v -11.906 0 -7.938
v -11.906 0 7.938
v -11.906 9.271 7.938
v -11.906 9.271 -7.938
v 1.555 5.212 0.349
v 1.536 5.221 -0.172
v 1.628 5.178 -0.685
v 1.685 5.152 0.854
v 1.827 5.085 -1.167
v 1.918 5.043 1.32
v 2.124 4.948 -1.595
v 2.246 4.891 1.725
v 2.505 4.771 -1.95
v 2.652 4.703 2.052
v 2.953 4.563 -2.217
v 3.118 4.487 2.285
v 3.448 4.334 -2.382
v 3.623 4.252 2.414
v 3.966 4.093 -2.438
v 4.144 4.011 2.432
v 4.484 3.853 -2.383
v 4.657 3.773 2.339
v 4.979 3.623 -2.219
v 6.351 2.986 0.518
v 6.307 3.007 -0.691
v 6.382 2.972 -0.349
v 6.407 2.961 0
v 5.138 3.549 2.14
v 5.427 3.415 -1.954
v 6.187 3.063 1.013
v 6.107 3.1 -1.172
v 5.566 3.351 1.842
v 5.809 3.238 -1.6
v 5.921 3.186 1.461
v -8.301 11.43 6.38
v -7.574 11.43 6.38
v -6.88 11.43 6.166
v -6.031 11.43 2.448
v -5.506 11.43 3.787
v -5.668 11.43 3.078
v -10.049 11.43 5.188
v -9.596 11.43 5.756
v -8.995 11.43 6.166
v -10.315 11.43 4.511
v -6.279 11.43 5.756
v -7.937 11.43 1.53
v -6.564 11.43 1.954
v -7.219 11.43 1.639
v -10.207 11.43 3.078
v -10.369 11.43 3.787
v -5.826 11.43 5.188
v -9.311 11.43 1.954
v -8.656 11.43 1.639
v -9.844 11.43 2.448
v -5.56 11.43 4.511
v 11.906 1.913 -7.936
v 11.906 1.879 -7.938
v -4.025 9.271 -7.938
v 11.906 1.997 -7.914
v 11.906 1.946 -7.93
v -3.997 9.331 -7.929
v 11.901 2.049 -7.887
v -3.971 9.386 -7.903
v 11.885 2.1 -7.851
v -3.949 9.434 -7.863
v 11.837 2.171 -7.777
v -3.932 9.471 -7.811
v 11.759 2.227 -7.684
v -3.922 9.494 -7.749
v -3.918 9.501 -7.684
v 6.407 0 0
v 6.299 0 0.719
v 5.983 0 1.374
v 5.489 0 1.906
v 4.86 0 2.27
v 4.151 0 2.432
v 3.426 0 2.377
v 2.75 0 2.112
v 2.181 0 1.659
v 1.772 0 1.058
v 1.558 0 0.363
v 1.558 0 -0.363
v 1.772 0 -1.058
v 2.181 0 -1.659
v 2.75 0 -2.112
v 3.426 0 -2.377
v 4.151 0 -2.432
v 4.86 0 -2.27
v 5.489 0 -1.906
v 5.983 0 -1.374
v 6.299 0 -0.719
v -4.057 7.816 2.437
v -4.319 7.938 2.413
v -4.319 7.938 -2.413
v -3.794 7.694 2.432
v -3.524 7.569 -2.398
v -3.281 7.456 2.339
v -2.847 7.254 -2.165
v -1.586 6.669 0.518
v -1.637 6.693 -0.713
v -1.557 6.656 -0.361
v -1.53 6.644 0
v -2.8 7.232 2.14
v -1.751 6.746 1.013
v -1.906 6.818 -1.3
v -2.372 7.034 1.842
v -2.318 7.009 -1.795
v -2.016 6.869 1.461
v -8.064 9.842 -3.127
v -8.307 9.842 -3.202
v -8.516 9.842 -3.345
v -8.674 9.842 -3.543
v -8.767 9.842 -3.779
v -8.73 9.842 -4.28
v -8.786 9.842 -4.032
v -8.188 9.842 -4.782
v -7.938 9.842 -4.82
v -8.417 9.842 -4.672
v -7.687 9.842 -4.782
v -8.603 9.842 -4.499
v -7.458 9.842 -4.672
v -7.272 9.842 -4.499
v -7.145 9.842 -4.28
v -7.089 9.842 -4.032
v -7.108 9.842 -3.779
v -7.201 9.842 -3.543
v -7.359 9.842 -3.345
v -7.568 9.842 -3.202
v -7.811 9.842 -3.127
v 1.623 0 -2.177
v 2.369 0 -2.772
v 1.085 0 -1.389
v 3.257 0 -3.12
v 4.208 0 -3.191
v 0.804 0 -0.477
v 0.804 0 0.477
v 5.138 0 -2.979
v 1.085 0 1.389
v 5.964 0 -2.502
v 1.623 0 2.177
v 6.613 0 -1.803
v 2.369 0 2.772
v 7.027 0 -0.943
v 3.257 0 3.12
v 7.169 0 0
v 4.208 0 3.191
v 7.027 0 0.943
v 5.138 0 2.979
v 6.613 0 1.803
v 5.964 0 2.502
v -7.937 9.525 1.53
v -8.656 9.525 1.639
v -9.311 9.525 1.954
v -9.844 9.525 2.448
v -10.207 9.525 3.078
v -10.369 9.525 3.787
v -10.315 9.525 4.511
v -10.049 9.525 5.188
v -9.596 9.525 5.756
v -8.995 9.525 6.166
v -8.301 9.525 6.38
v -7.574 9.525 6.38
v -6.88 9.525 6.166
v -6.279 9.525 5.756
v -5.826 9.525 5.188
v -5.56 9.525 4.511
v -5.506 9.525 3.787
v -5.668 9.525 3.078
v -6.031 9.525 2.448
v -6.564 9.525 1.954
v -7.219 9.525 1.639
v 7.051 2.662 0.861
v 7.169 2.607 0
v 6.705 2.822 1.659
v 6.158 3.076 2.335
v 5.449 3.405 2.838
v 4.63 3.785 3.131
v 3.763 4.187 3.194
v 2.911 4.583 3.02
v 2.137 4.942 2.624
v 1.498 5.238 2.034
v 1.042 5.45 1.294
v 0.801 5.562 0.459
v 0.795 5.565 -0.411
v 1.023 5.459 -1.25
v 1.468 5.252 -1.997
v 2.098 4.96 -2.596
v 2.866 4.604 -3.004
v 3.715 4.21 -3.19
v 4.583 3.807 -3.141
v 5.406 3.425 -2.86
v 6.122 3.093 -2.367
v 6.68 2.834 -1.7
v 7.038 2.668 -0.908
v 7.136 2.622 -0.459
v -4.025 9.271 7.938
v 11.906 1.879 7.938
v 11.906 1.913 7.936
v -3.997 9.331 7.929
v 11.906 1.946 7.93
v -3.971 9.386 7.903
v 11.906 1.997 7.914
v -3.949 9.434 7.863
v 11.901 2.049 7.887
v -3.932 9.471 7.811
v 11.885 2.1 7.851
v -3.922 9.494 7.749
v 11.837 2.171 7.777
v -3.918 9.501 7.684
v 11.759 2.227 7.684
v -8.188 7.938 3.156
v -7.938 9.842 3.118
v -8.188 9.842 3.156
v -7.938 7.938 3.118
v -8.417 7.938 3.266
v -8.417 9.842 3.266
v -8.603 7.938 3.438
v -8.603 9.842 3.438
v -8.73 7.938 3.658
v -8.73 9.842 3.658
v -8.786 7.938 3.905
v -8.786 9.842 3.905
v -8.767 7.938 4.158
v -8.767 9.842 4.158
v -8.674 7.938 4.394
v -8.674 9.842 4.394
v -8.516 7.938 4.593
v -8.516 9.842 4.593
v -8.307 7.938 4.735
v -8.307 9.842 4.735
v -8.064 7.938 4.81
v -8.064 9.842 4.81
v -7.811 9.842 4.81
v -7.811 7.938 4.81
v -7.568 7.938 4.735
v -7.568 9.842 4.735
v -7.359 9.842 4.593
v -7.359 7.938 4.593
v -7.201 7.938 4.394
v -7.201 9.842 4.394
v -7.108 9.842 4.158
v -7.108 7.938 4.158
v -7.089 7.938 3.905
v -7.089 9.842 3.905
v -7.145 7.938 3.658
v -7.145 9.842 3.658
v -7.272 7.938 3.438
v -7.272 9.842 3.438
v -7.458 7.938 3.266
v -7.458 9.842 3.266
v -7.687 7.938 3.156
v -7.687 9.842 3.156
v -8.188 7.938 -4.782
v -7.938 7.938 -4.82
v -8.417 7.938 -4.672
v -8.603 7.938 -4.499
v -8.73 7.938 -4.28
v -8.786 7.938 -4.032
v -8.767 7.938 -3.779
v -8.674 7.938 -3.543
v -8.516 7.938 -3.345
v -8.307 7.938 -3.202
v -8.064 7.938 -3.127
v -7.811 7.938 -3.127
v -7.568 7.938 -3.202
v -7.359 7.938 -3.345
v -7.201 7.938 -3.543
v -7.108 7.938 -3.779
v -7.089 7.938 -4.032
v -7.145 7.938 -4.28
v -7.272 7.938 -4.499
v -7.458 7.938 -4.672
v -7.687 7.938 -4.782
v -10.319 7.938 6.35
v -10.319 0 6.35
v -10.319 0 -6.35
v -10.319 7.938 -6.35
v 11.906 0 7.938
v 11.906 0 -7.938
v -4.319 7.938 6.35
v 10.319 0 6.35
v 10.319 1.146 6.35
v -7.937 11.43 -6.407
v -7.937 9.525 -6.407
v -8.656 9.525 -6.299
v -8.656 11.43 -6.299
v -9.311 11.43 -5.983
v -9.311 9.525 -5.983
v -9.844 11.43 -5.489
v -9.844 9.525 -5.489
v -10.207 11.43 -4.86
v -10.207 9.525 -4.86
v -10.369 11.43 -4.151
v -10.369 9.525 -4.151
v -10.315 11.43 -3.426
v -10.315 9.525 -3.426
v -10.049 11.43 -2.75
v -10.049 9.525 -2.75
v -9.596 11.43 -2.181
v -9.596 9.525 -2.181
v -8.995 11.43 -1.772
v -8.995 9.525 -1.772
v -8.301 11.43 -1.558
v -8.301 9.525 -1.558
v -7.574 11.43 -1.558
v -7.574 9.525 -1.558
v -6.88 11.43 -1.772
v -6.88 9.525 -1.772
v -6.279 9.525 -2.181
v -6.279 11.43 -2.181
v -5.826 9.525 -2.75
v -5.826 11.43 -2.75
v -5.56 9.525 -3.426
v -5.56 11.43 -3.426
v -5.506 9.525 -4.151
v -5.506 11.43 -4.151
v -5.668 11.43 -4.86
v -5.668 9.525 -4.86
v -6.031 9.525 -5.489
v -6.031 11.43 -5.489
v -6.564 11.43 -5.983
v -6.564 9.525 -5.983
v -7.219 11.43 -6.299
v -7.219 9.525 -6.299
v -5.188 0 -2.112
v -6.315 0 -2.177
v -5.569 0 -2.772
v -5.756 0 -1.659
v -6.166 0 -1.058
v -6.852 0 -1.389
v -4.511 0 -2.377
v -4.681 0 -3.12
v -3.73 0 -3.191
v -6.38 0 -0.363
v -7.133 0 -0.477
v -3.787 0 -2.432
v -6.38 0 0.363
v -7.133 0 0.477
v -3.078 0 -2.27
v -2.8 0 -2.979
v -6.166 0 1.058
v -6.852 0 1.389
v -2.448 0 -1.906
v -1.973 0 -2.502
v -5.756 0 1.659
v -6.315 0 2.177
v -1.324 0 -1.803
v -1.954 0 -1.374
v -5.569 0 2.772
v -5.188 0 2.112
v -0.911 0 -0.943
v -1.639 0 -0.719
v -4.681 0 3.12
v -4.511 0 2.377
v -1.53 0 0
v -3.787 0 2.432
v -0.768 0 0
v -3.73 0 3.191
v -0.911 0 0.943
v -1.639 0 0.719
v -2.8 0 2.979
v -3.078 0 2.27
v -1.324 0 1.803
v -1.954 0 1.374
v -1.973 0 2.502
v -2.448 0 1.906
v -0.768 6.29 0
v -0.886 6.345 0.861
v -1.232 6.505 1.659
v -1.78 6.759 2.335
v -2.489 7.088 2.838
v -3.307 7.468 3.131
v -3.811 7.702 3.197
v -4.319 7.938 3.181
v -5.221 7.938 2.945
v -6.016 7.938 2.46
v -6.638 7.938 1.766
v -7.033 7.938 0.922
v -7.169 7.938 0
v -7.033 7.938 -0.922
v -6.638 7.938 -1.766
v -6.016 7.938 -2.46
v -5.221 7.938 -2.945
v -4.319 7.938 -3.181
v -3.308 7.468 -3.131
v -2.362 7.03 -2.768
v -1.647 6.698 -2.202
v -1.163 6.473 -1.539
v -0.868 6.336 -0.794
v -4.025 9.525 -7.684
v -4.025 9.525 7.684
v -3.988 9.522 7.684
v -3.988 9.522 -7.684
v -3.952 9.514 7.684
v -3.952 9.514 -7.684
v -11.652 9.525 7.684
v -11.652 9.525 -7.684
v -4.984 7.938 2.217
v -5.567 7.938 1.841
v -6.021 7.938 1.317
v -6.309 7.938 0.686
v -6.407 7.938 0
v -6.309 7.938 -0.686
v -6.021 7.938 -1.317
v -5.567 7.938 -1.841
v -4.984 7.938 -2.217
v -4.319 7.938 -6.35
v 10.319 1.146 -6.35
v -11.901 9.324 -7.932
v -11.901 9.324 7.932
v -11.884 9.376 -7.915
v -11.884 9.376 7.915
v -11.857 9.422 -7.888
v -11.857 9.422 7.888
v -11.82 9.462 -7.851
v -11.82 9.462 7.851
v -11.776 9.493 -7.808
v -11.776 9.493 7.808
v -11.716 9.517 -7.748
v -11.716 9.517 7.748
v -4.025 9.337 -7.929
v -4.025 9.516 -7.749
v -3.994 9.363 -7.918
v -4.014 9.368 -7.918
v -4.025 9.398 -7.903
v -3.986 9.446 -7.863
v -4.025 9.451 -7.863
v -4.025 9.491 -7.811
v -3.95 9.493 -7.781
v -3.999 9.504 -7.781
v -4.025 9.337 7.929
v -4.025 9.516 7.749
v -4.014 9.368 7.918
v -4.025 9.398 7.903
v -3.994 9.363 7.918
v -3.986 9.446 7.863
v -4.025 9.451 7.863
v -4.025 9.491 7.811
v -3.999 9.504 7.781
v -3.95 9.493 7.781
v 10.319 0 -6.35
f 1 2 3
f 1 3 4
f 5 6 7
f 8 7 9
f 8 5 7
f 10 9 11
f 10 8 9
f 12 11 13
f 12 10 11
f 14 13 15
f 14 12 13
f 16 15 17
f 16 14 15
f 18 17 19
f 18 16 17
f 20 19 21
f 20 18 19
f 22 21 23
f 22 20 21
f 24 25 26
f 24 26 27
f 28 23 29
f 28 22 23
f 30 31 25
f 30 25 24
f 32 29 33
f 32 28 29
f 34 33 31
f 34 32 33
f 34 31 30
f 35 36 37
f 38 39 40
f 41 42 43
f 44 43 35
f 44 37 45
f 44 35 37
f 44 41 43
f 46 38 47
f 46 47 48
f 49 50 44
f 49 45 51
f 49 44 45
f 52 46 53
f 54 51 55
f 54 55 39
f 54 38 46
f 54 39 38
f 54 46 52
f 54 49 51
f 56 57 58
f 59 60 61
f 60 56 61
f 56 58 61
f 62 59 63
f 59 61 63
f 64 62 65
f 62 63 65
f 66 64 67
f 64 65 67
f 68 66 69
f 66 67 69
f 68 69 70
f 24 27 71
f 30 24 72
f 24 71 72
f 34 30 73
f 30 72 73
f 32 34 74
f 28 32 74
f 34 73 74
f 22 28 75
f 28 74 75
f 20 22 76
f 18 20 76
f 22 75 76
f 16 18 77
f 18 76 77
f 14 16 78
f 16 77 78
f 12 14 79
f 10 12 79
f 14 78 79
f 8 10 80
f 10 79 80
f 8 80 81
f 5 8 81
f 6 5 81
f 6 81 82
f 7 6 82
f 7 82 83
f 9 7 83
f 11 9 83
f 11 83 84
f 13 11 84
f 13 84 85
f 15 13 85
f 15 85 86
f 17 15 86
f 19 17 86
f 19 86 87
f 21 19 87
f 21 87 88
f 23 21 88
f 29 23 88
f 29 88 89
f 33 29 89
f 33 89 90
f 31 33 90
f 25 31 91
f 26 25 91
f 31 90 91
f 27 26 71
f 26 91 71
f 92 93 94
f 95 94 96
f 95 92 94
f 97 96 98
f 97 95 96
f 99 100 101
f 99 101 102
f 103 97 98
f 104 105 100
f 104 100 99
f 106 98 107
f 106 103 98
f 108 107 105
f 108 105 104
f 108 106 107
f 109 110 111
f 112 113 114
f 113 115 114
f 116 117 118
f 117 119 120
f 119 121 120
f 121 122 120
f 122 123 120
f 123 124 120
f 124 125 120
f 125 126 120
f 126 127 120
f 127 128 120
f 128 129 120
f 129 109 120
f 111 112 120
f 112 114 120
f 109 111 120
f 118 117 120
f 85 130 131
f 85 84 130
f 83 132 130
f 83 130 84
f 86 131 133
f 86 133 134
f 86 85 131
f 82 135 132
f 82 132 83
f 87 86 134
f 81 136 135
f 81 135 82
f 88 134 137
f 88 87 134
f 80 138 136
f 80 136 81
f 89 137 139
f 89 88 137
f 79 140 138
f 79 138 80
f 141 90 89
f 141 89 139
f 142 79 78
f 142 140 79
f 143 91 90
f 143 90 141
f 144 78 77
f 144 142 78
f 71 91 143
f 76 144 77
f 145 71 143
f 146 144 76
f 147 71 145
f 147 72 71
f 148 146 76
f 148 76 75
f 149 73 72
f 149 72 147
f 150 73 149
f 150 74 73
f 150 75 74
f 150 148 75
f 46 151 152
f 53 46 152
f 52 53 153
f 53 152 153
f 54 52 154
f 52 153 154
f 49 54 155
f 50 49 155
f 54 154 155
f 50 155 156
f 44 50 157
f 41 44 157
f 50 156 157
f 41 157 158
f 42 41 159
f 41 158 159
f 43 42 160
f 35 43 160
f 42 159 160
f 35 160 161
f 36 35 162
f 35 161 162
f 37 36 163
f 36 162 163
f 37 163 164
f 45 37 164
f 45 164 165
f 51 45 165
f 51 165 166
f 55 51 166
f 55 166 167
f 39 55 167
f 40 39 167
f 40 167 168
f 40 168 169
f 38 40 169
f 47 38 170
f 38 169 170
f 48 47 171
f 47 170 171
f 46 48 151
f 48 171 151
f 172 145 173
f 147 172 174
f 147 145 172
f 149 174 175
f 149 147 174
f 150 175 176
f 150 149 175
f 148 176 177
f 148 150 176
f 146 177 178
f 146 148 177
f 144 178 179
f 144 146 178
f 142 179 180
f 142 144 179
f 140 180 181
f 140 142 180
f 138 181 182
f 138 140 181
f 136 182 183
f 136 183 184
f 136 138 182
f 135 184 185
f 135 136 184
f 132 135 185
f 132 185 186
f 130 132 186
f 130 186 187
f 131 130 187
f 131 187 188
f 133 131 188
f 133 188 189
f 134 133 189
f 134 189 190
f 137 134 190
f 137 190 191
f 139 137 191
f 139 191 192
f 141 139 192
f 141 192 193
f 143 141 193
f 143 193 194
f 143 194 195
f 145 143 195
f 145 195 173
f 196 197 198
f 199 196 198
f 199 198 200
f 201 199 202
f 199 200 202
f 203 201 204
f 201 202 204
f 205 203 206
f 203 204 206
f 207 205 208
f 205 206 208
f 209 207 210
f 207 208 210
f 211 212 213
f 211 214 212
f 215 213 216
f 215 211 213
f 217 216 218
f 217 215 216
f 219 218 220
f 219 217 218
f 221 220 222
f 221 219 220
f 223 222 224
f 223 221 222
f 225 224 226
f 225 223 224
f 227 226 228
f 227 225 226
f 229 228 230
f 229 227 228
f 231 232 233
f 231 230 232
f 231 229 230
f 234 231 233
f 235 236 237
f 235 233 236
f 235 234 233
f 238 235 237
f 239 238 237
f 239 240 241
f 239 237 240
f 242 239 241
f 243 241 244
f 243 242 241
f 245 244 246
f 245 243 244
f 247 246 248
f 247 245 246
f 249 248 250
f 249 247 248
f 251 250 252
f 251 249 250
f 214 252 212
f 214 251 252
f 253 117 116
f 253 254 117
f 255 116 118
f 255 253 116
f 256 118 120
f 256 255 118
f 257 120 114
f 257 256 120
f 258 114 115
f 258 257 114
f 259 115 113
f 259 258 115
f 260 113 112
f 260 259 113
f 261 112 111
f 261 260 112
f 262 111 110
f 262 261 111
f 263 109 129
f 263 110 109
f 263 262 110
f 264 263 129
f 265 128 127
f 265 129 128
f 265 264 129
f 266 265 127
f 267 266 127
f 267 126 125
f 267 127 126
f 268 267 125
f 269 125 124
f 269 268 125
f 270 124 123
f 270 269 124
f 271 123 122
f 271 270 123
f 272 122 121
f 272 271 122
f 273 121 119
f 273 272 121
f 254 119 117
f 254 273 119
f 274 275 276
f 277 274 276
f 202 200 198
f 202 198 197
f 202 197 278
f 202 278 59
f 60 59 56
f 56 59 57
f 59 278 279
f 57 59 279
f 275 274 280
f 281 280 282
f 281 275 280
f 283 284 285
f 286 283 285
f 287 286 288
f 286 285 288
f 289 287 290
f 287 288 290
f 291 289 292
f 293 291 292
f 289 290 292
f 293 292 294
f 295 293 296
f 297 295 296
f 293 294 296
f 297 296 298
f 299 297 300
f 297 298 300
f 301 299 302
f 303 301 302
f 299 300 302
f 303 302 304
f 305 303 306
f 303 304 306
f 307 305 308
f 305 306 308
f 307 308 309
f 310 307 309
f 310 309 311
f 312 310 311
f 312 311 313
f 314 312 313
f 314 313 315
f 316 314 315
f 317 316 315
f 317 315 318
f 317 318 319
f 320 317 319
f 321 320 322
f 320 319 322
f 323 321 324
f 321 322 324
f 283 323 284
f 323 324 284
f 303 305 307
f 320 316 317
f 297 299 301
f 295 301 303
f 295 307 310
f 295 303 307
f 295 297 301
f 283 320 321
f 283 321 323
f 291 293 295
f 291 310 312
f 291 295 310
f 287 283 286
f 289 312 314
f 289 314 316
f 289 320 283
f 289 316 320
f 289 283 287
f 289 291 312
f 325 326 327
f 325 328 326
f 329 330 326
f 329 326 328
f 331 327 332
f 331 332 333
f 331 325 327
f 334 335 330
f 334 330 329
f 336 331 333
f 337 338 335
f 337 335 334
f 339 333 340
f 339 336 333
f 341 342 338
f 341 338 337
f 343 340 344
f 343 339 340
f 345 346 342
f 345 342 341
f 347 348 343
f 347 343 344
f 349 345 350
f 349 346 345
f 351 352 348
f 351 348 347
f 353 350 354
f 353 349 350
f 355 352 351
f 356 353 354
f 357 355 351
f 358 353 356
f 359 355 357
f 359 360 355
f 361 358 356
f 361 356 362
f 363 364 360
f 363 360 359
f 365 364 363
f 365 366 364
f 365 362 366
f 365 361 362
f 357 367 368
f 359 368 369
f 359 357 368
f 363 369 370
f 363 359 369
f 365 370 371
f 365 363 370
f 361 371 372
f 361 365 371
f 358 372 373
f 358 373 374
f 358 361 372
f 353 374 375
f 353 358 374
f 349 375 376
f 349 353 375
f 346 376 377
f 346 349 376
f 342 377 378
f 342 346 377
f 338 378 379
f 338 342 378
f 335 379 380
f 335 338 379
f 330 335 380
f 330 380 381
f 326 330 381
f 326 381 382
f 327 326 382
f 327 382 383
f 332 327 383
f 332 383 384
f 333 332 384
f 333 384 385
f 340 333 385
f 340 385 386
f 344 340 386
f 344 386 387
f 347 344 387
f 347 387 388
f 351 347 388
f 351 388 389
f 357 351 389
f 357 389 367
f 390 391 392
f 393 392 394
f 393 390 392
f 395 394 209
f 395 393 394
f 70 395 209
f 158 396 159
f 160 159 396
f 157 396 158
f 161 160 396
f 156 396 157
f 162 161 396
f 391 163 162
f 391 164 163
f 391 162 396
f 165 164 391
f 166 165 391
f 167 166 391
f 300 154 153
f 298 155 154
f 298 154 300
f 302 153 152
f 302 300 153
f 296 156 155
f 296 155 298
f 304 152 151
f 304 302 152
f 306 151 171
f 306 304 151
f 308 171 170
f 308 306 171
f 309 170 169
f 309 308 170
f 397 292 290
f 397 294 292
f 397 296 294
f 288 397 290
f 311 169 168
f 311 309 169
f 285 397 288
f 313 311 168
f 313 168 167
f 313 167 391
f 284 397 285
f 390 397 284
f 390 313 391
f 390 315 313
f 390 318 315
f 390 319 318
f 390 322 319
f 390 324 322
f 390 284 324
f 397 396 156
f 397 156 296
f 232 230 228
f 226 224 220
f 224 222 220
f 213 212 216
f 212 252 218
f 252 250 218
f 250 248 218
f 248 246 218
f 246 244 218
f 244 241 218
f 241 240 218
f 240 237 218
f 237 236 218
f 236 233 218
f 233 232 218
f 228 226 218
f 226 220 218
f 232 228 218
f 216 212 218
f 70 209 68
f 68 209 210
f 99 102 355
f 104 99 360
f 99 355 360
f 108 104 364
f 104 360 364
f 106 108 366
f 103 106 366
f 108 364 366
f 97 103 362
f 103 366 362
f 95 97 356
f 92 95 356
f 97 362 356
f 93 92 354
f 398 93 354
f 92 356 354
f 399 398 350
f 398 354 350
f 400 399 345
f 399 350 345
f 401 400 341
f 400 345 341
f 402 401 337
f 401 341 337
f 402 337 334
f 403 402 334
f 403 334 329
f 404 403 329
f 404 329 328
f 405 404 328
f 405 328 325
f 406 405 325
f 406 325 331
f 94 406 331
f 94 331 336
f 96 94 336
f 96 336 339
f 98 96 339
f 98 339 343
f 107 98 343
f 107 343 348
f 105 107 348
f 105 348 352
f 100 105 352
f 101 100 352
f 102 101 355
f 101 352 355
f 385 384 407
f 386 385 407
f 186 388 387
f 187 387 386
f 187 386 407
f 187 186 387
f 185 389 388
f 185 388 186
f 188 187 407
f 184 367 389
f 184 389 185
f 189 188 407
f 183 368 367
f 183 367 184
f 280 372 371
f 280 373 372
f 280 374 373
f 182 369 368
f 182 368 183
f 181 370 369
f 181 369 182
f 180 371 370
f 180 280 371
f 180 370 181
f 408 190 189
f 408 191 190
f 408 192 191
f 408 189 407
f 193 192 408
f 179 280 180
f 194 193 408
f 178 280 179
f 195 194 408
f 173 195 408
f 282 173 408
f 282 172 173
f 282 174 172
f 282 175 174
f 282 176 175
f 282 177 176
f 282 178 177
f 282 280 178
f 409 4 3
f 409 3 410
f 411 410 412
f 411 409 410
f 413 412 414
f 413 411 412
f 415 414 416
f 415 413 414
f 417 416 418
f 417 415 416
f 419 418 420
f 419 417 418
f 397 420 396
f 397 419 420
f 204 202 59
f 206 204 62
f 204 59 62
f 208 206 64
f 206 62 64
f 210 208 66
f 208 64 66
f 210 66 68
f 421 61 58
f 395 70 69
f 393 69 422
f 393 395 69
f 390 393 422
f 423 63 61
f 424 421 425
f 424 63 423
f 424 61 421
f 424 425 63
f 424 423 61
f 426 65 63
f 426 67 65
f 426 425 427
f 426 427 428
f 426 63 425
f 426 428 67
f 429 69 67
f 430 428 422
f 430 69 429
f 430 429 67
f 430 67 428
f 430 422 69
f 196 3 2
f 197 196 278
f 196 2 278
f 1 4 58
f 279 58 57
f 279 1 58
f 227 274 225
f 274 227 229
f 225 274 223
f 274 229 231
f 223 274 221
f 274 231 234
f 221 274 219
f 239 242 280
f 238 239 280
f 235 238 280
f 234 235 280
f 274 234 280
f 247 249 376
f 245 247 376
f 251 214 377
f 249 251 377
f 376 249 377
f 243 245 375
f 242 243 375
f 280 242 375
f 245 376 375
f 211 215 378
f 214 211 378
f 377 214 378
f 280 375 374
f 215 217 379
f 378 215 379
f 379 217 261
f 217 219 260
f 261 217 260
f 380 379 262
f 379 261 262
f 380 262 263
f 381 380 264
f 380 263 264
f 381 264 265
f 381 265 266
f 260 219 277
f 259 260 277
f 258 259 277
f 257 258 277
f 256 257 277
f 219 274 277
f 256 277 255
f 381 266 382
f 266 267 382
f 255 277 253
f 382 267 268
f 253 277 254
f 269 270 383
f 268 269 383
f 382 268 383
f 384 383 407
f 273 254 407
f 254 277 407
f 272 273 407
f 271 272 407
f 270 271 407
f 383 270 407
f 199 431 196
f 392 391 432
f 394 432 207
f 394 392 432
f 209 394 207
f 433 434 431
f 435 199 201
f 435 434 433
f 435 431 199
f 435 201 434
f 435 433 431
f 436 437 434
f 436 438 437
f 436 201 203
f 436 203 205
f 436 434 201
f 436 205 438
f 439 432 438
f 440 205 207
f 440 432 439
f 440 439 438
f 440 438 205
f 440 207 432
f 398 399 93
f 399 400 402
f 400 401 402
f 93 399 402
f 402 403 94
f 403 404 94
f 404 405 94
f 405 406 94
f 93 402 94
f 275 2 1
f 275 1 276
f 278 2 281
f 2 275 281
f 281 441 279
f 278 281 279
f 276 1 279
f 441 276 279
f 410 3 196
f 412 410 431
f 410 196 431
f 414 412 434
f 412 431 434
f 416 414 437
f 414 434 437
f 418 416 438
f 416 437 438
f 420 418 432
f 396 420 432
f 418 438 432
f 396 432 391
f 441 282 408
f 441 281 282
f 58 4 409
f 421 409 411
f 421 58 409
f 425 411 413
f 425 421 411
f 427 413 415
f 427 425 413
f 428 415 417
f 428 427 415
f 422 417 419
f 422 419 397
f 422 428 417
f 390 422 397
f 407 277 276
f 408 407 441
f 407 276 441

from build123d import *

# Parameters (mm, degrees)
SKETCH1_W            = 23.8125
SKETCH1_H            = 15.875
BASE_EXTRUDE_DEPTH   = 9.525
SKETCH2_R            = 2.4384
BOSS_EXTRUDE1_DEPTH  = 1.905
LPATTERN4_COUNT      = 3
LPATTERN4_PITCH      = 7.9375
LPATTERN4_COUNT_DIR2 = 2
LPATTERN4_PITCH_DIR2 = 7.9375
CUT_EXTRUDE1_DEPTH   = 23.900203363
SHELL1_T             = -1.5875
INSDOT_REACH         = 20.314
SKETCH3_R            = 3.2004
SKETCH3_R_2          = 2.4384
LPATTERN5_COUNT      = 2
LPATTERN5_PITCH      = 7.9375
FILLET1_R            = 0.254


with BuildPart() as part:
    # Sketch1 → Base-Extrude (new body)
    with BuildSketch(Plane(origin=(0, 0, 0), x_dir=(1, 0, 0), z_dir=(0, 1, 0))):
        Rectangle(SKETCH1_W, SKETCH1_H)
    extrude(amount=BASE_EXTRUDE_DEPTH)

    # Sketch2 → Boss-Extrude1 (add)
    with BuildSketch(Plane(origin=(0, 9.525, 0), x_dir=(-1, 0, 0), z_dir=(0, 1, 0))):
        with Locations(Location((7.9375, 3.96875, 0), (0, 0, 270))):
            Circle(SKETCH2_R)
    boss_extrude1 = extrude(amount=BOSS_EXTRUDE1_DEPTH)

    # LPattern4: Boss-Extrude1 3 × 2
    with Locations(*[(i * LPATTERN4_PITCH, 0, -j * LPATTERN4_PITCH_DIR2) for i in range(LPATTERN4_COUNT) for j in range(LPATTERN4_COUNT_DIR2) if (i, j) != (0, 0)]):
        add(boss_extrude1)

    # Sketch4 → Cut-Extrude1 (cut, through all)
    with BuildSketch(Plane.XY.offset(7.9375)):
        Polygon((-3.96875, 9.525), (11.90625, 2.159), (11.90625, 11.43), (-3.96875, 11.43), align=None)
    extrude(amount=-CUT_EXTRUDE1_DEPTH, mode=Mode.SUBTRACT)

    # Shell1
    shell1_openings = [part.faces().sort_by_distance(p)[0] for p in [
        (0, 0, 0),
    ]]
    offset(amount=SHELL1_T, openings=shell1_openings, kind=Kind.INTERSECTION)

    # Sketch3 → InsDot (add, up to next)
    with BuildSketch(Plane.XZ, mode=Mode.PRIVATE) as insdot_sk1:
        with Locations((-3.96875, 0)):
            Circle(SKETCH3_R)
        with Locations((-3.96875, 0)):
            Circle(SKETCH3_R_2, mode=Mode.SUBTRACT)
    insdot_tool1 = extrude(insdot_sk1.sketch, amount=-INSDOT_REACH, mode=Mode.PRIVATE) - part.part
    insdot = insdot_tool1.solids().sort_by_distance((-7.078629, 0, 0))[0]
    add(insdot)

    # LPattern5: InsDot; each copy of InsDot runs up to whatever stops it at its own place
    lpattern5_before = part.part  # the part as the pattern finds it: every copy runs up to it
    lpattern5_insdot_long = extrude(insdot_sk1.sketch, amount=-INSDOT_REACH, mode=Mode.PRIVATE)
    lpattern5_insdot_tool1 = lpattern5_insdot_long.moved(Location(Vector(1, 0, 0) * (1 * LPATTERN5_PITCH))) - lpattern5_before
    add(lpattern5_insdot_tool1.solids().sort_by_distance((0.858871, 0, 0))[0])

    # Fillet1
    fillet1_edges = [part.edges().sort_by_distance(p)[0] for p in [
        (-7.9375, 9.525, -7.9375),
        (-7.9375, 9.525, 7.9375),
        (3.96875, 5.842, 7.9375),
        (-3.96875, 9.525, 0),
        (3.96875, 5.842, -7.9375),
        (11.90625, 2.159, 0),
        (-11.90625, 9.525, 0),
    ]]
    fillet(fillet1_edges, radius=FILLET1_R)


solid = part.part
